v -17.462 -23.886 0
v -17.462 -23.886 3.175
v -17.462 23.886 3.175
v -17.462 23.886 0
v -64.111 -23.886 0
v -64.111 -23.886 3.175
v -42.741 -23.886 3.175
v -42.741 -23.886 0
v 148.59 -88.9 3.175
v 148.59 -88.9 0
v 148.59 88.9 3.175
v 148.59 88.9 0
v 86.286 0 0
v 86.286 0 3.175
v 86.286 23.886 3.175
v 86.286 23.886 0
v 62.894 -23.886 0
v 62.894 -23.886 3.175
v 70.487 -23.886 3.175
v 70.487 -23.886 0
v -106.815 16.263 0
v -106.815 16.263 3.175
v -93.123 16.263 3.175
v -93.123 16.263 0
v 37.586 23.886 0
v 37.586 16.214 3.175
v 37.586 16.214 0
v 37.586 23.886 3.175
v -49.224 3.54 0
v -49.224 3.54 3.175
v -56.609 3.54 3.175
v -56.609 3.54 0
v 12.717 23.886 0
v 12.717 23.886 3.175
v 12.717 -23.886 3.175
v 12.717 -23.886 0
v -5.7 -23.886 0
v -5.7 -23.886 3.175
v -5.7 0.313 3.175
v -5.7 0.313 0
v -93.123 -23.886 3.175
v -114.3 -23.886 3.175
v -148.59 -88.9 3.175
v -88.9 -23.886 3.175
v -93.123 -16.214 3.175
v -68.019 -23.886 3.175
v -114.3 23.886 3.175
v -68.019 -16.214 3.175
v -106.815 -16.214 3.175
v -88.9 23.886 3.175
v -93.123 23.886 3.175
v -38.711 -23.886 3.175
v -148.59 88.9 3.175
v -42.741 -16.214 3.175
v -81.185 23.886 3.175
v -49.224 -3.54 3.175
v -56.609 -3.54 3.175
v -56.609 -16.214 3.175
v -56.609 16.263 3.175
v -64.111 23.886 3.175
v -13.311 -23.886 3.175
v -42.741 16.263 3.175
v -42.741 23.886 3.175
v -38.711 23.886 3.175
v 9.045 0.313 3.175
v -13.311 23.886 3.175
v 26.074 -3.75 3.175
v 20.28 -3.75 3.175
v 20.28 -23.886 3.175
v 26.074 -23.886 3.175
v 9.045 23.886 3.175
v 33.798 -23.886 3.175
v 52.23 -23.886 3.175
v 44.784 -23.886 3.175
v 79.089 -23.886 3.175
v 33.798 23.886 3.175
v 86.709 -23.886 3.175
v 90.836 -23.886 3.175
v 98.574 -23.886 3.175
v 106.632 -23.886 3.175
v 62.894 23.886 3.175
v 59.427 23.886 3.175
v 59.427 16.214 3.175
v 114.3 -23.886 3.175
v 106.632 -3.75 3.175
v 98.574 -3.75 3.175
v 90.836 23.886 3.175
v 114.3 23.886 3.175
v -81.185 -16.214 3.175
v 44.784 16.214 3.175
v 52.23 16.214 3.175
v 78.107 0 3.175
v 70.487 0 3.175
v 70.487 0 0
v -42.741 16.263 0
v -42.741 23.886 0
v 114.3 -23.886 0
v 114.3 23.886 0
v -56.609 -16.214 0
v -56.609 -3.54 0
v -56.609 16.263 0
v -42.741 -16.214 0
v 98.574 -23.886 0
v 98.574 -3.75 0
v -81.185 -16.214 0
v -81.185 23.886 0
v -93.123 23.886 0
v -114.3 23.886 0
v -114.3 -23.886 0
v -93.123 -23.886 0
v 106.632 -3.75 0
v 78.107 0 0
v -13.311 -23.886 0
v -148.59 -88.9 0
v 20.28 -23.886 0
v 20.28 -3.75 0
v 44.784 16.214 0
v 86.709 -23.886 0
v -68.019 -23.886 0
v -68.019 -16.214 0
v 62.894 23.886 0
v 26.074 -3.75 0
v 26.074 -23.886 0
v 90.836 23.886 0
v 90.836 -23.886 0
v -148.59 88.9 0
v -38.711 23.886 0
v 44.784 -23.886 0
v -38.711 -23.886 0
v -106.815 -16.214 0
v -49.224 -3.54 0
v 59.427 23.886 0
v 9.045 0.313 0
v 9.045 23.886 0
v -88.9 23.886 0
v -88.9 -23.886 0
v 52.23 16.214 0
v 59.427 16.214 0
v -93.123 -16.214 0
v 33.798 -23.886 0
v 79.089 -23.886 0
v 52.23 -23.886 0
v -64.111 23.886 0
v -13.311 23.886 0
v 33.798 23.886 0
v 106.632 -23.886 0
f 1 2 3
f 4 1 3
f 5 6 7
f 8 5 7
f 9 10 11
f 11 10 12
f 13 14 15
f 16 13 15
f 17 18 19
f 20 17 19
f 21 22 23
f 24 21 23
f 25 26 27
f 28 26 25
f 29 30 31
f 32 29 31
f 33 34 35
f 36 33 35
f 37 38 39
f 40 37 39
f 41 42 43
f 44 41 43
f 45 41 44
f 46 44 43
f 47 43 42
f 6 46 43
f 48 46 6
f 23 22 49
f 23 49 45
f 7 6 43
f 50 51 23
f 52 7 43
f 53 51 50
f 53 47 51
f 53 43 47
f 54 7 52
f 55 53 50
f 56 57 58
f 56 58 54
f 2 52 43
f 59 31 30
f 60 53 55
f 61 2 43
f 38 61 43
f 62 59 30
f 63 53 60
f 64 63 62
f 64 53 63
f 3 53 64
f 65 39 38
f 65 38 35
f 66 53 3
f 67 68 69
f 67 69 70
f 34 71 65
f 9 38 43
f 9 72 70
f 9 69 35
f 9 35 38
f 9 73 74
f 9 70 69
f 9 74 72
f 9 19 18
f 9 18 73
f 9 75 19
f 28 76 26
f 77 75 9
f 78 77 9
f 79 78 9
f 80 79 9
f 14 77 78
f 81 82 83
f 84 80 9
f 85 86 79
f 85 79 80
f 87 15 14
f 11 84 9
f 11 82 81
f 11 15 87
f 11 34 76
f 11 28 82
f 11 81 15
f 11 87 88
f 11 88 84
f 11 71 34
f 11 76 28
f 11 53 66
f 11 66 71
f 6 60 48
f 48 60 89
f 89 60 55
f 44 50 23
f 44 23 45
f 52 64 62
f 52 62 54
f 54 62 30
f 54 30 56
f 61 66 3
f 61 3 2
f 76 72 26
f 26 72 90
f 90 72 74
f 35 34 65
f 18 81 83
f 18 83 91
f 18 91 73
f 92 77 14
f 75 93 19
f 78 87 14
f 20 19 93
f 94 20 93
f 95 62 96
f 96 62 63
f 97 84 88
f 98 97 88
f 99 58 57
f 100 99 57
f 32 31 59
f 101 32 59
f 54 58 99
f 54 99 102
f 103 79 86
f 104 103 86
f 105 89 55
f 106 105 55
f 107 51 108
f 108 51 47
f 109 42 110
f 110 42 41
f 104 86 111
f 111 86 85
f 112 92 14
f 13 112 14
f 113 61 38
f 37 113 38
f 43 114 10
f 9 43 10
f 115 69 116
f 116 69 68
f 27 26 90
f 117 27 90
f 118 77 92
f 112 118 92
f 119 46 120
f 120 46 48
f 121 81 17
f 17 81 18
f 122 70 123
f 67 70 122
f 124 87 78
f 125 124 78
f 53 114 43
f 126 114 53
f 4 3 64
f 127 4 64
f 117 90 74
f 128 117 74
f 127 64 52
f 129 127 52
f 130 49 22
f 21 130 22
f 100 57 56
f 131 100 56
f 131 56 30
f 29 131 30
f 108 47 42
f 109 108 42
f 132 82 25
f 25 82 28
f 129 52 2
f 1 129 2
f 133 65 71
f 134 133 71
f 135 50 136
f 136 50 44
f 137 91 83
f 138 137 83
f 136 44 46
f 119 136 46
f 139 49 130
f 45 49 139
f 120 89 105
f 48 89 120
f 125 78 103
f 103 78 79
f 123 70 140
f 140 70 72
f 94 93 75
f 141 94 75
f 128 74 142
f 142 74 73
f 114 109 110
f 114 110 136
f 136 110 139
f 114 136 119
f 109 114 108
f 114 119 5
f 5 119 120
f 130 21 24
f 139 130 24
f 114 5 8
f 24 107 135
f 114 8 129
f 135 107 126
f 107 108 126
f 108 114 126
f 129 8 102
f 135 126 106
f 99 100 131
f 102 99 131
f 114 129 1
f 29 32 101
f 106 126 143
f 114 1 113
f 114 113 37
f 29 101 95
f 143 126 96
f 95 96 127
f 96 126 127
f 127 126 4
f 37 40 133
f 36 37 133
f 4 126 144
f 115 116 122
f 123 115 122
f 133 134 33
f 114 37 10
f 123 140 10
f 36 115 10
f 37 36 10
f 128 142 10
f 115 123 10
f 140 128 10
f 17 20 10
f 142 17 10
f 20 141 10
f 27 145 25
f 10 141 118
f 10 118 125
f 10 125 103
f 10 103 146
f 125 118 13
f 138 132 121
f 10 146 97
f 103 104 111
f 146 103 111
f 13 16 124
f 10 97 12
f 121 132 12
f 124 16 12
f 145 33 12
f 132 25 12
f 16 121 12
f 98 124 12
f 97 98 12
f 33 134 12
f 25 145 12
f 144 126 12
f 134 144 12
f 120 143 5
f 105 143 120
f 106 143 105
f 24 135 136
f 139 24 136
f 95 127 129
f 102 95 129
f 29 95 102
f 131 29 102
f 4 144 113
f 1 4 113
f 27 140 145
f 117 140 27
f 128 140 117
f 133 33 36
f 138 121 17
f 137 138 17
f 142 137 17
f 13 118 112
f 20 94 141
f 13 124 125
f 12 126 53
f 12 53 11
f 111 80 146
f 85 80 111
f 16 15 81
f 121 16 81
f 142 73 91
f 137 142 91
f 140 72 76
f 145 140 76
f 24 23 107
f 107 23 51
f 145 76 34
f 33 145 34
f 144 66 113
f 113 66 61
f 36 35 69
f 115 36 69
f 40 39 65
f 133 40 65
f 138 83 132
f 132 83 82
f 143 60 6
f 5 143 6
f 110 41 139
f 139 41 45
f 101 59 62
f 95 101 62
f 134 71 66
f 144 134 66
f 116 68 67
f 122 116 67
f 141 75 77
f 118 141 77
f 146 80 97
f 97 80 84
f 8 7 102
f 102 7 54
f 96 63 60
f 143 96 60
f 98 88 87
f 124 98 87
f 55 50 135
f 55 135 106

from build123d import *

# Parameters (mm, degrees)
SKETCH1_W           = 297.18
SKETCH1_H           = 177.8
BOSS_EXTRUDE1_DEPTH = 3.175
SKETCH3_W           = 13.69262242
SKETCH3_H           = 7.623435988
SKETCH3_W_2         = 7.48484453
SKETCH3_H_2         = 16.262538767
SKETCH3_H_3         = 16.21355287
SKETCH3_H_4         = 7.672421885
SKETCH3_W_3         = 7.714624958
SKETCH3_H_5         = 23.885974755
SKETCH3_W_4         = 13.165983096
SKETCH3_W_5         = 7.502078631
SKETCH3_H_6         = 3.540074356
SKETCH3_W_6         = 7.385030665
SKETCH3_H_7         = 12.673478514
SKETCH3_W_7         = 13.868168861
SKETCH3_H_8         = 12.722464411
SKETCH3_W_8         = 7.610546603
SKETCH3_H_9         = 8.377243284
SKETCH3_H_10        = 7.522942085
SKETCH3_W_9         = 7.199942392
SKETCH3_W_10        = 7.545958675
SKETCH3_H_11        = 0.313367501
SKETCH3_W_11        = 6.151941086
SKETCH3_W_12        = 7.563125845
SKETCH3_W_13        = 5.793032563
SKETCH3_W_14        = 7.724043416
SKETCH3_H_12        = 12.138714327
SKETCH3_H_13        = 20.136219216
SKETCH3_H_14        = 4.074838543
SKETCH3_H_15        = 3.749755539
SKETCH3_W_15        = 7.197404092
SKETCH3_W_16        = 7.446094885
SKETCH3_W_17        = 7.592383586
SKETCH3_W_18        = 8.426229181
SKETCH3_W_19        = 7.372950534
SKETCH3_H_16        = 7.836309586
SKETCH3_W_20        = 7.738672287
SKETCH3_W_21        = 8.057581655
SKETCH3_W_22        = 7.668237515
CUT_EXTRUDE4_DEPTH  = 3.175


with BuildPart() as part:
    # Sketch1 → Boss-Extrude1 (new body)
    with BuildSketch(Plane.XY):
        Rectangle(SKETCH1_W, SKETCH1_H)
    extrude(amount=BOSS_EXTRUDE1_DEPTH)

    # Sketch3 → Cut-Extrude4 (cut)
    with BuildSketch(Plane.XY.offset(3.175)):
        with Locations((-99.96884426, 20.074256761)):
            Rectangle(SKETCH3_W, SKETCH3_H)
        with Locations((-110.557577735, 20.074256761)):
            Rectangle(SKETCH3_W_2, SKETCH3_H)
        with Locations((-110.557577735, 8.131269384)):
            Rectangle(SKETCH3_W_2, SKETCH3_H_2)
        with Locations((-110.557577735, -8.106776435)):
            Rectangle(SKETCH3_W_2, SKETCH3_H_3)
        with Locations((-110.557577735, -20.049763813)):
            Rectangle(SKETCH3_W_2, SKETCH3_H_4)
        with Locations((-99.96884426, -20.049763813)):
            Rectangle(SKETCH3_W, SKETCH3_H_4)
        with Locations((-85.042687521, 11.942987378)):
            Rectangle(SKETCH3_W_3, SKETCH3_H_5)
        with Locations((-85.042687521, -8.106776435)):
            Rectangle(SKETCH3_W_3, SKETCH3_H_3)
        with Locations((-74.602383494, -20.049763813)):
            Rectangle(SKETCH3_W_4, SKETCH3_H_4)
        with Locations((-85.042687521, -20.049763813)):
            Rectangle(SKETCH3_W_3, SKETCH3_H_4)
        with Locations((-60.359912579, 1.770037178)):
            Rectangle(SKETCH3_W_5, SKETCH3_H_6)
        with Locations((-52.916357931, 1.770037178)):
            Rectangle(SKETCH3_W_6, SKETCH3_H_6)
        with Locations((-52.916357931, -1.770037178)):
            Rectangle(SKETCH3_W_6, SKETCH3_H_6)
        with Locations((-60.359912579, -1.770037178)):
            Rectangle(SKETCH3_W_5, SKETCH3_H_6)
        with Locations((-60.359912579, -9.876813613)):
            Rectangle(SKETCH3_W_5, SKETCH3_H_7)
        with Locations((-60.359912579, -20.049763813)):
            Rectangle(SKETCH3_W_5, SKETCH3_H_4)
        with Locations((-49.674788833, -20.049763813)):
            Rectangle(SKETCH3_W_7, SKETCH3_H_4)
        with Locations((-60.359912579, 9.901306562)):
            Rectangle(SKETCH3_W_5, SKETCH3_H_8)
        with Locations((-60.359912579, 20.074256761)):
            Rectangle(SKETCH3_W_5, SKETCH3_H)
        with Locations((-49.674788833, 20.074256761)):
            Rectangle(SKETCH3_W_7, SKETCH3_H)
        Polygon((-25.010513832, 0), (-17.462016857, 0), (-17.462016857, 23.885974755), (-38.710951894, 23.885974755), (-38.710951894, 0), (-31.162454918, 0), (-31.162454918, 16.21355287), (-25.010513832, 16.21355287), align=None)
        Polygon((-17.462016857, -23.885974755), (-17.462016857, 0), (-25.010513832, 0), (-25.010513832, -16.21355287), (-31.162454918, -16.21355287), (-31.162454918, 0), (-38.710951894, 0), (-38.710951894, -23.885974755), align=None)
        with Locations((-9.505678593, -11.942987378)):
            Rectangle(SKETCH3_W_8, SKETCH3_H_5)
        with Locations((-9.505678593, 20.049763813)):
            Rectangle(SKETCH3_W_8, SKETCH3_H_4)
        with Locations((-9.505678593, 12.024931228)):
            Rectangle(SKETCH3_W_8, SKETCH3_H_9)
        with Locations((-9.505678593, 4.074838544)):
            Rectangle(SKETCH3_W_8, SKETCH3_H_10)
        with Locations((-2.100434095, 4.074838544)):
            Rectangle(SKETCH3_W_9, SKETCH3_H_10)
        with Locations((5.272516439, 4.074838544)):
            Rectangle(SKETCH3_W_10, SKETCH3_H_10)
        with Locations((5.272516439, 12.024931228)):
            Rectangle(SKETCH3_W_10, SKETCH3_H_9)
        with Locations((5.272516439, 20.049763813)):
            Rectangle(SKETCH3_W_10, SKETCH3_H_4)
        with Locations((-2.100434095, 20.049763813)):
            Rectangle(SKETCH3_W_9, SKETCH3_H_4)
        with Locations((-9.505678593, 0.15668375)):
            Rectangle(SKETCH3_W_8, SKETCH3_H_11)
        with Locations((-28.086484375, 8.106776435)):
            Rectangle(SKETCH3_W_11, SKETCH3_H_3)
        with Locations((-28.086484375, -8.106776435)):
            Rectangle(SKETCH3_W_11, SKETCH3_H_3)
        with Locations((-2.100434095, 12.024931228)):
            Rectangle(SKETCH3_W_9, SKETCH3_H_9)
        with Locations((16.498905095, 20.049763813)):
            Rectangle(SKETCH3_W_12, SKETCH3_H_4)
        with Locations((23.176984299, 20.049763813)):
            Rectangle(SKETCH3_W_13, SKETCH3_H_4)
        with Locations((29.935522289, 20.049763813)):
            Rectangle(SKETCH3_W_14, SKETCH3_H_4)
        with Locations((29.935522289, 10.144195706)):
            Rectangle(SKETCH3_W_14, SKETCH3_H_12)
        with Locations((16.498905095, 10.144195706)):
            Rectangle(SKETCH3_W_12, SKETCH3_H_12)
        with Locations((16.498905095, -13.817865147)):
            Rectangle(SKETCH3_W_12, SKETCH3_H_13)
        with Locations((29.935522289, -13.817865147)):
            Rectangle(SKETCH3_W_14, SKETCH3_H_13)
        with Locations((23.176984299, 2.037419272)):
            Rectangle(SKETCH3_W_13, SKETCH3_H_14)
        with Locations((23.176984299, -1.87487777)):
            Rectangle(SKETCH3_W_13, SKETCH3_H_15)
        with Locations((16.498905095, -1.87487777)):
            Rectangle(SKETCH3_W_12, SKETCH3_H_15)
        with Locations((16.498905095, 2.037419272)):
            Rectangle(SKETCH3_W_12, SKETCH3_H_14)
        with Locations((29.935522289, 2.037419272)):
            Rectangle(SKETCH3_W_14, SKETCH3_H_14)
        with Locations((29.935522289, -1.87487777)):
            Rectangle(SKETCH3_W_14, SKETCH3_H_15)
        with Locations((23.176984299, 10.144195706)):
            Rectangle(SKETCH3_W_13, SKETCH3_H_12)
        with Locations((41.185123401, 20.049763813)):
            Rectangle(SKETCH3_W_15, SKETCH3_H_4)
        with Locations((48.50687289, 20.049763813)):
            Rectangle(SKETCH3_W_16, SKETCH3_H_4)
        with Locations((55.828622378, 20.049763813)):
            Rectangle(SKETCH3_W_15, SKETCH3_H_4)
        with Locations((48.50687289, 8.106776435)):
            Rectangle(SKETCH3_W_16, SKETCH3_H_3)
        with Locations((66.690558432, 20.049763813)):
            Rectangle(SKETCH3_W_17, SKETCH3_H_4)
        with Locations((74.699864816, 20.049763813)):
            Rectangle(SKETCH3_W_18, SKETCH3_H_4)
        with Locations((48.50687289, -11.942987378)):
            Rectangle(SKETCH3_W_16, SKETCH3_H_5)
        with Locations((82.599454673, 20.049763813)):
            Rectangle(SKETCH3_W_19, SKETCH3_H_4)
        with Locations((74.699864816, 12.024931228)):
            Rectangle(SKETCH3_W_18, SKETCH3_H_9)
        with Locations((66.690558432, 12.024931228)):
            Rectangle(SKETCH3_W_17, SKETCH3_H_9)
        with Locations((82.599454673, 12.024931228)):
            Rectangle(SKETCH3_W_19, SKETCH3_H_9)
        Polygon((70.486750225, 7.836309586), (70.486750225, 0), (78.106750225, 0), (86.28592994, 0), (86.28592994, 7.836309586), (78.912979406, 7.836309586), align=None)
        Polygon((78.106750225, 0), (70.486750225, 0), (79.088525848, -23.885974755), (86.708525848, -23.885974755), align=None)
        with Locations((66.690558432, -11.942987378)):
            Rectangle(SKETCH3_W_17, SKETCH3_H_5)
        with Locations((66.690558432, 3.918154793)):
            Rectangle(SKETCH3_W_17, SKETCH3_H_16)
        with Locations((94.704844686, 20.049763813)):
            Rectangle(SKETCH3_W_20, SKETCH3_H_4)
        with Locations((102.602971658, 20.049763813)):
            Rectangle(SKETCH3_W_21, SKETCH3_H_4)
        with Locations((94.704844686, 10.144195706)):
            Rectangle(SKETCH3_W_20, SKETCH3_H_12)
        with Locations((110.465881243, 20.049763813)):
            Rectangle(SKETCH3_W_22, SKETCH3_H_4)
        with Locations((110.465881243, 10.144195706)):
            Rectangle(SKETCH3_W_22, SKETCH3_H_12)
        with Locations((110.465881243, -13.817865147)):
            Rectangle(SKETCH3_W_22, SKETCH3_H_13)
        with Locations((102.602971658, 10.144195706)):
            Rectangle(SKETCH3_W_21, SKETCH3_H_12)
        with Locations((94.704844686, -1.87487777)):
            Rectangle(SKETCH3_W_20, SKETCH3_H_15)
        with Locations((94.704844686, 2.037419272)):
            Rectangle(SKETCH3_W_20, SKETCH3_H_14)
        with Locations((110.465881243, 2.037419272)):
            Rectangle(SKETCH3_W_22, SKETCH3_H_14)
        with Locations((102.602971658, -1.87487777)):
            Rectangle(SKETCH3_W_21, SKETCH3_H_15)
        with Locations((94.704844686, -13.817865147)):
            Rectangle(SKETCH3_W_20, SKETCH3_H_13)
        with Locations((102.602971658, 2.037419272)):
            Rectangle(SKETCH3_W_21, SKETCH3_H_14)
        with Locations((110.465881243, -1.87487777)):
            Rectangle(SKETCH3_W_22, SKETCH3_H_15)
    extrude(amount=-CUT_EXTRUDE4_DEPTH, mode=Mode.SUBTRACT)


solid = part.part
